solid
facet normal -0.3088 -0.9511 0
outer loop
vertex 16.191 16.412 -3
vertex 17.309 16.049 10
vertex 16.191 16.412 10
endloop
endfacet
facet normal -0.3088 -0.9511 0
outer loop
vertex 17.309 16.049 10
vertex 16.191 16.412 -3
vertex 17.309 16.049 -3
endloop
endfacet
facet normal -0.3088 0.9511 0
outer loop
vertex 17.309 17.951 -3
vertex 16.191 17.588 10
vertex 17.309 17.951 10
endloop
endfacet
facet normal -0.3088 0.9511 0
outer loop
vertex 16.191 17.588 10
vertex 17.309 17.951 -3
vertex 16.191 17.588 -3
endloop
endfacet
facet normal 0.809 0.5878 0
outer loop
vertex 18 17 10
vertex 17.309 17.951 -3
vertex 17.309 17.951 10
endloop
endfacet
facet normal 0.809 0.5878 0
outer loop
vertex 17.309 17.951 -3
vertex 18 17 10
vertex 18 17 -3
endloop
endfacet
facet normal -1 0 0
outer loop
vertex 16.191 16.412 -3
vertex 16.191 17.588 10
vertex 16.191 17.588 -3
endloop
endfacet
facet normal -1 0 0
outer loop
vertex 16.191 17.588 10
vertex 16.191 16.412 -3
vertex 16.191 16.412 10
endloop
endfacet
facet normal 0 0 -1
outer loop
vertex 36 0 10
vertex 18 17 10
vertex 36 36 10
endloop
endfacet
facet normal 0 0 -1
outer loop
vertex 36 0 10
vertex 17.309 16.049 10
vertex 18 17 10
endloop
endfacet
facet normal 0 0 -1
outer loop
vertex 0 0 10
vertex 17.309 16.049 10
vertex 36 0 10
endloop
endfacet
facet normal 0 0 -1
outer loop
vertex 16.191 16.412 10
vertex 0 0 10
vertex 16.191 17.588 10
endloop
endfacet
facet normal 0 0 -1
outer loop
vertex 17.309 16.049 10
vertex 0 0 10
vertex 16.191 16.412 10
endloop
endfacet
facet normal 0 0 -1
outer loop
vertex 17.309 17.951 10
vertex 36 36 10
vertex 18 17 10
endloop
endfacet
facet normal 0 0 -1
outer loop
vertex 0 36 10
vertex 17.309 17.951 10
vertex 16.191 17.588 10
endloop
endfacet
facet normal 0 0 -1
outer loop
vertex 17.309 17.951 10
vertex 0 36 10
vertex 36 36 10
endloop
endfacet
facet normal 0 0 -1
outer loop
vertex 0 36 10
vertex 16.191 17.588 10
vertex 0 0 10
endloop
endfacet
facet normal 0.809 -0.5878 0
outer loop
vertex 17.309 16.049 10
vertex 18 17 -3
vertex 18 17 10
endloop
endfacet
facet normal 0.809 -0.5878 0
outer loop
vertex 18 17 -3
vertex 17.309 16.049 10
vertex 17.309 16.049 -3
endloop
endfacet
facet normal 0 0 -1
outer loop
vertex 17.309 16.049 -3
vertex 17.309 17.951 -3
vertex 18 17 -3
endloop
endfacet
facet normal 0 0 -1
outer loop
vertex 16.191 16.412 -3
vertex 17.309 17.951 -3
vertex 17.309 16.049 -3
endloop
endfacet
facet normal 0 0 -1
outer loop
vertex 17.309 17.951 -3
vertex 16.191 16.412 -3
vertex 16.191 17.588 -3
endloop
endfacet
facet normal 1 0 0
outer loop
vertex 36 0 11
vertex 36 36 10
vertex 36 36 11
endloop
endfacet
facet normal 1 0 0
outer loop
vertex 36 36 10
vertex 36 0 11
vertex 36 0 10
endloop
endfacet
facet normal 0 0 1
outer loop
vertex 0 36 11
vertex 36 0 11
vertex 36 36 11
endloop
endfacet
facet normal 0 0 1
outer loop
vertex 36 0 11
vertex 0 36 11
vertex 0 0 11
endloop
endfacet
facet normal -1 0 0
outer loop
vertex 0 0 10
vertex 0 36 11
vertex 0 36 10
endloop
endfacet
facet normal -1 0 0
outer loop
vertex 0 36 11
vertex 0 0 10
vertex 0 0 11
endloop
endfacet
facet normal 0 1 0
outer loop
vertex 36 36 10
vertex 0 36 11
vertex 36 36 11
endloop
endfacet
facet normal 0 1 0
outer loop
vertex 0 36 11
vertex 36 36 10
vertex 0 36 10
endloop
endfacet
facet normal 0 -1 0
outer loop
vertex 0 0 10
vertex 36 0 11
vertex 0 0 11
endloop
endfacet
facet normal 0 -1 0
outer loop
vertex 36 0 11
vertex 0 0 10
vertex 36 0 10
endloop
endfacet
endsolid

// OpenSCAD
//Settings.
resolution_factor = 1; //Increase to reduce resolution and file size.

//Calculations.
res = 360 / resolution_factor;
wave_points = (res + 1) * (res + 1);

points = [
	for(x = [0:res])
		for(y = [0:res])
			[x / 10 * resolution_factor, y / 10 * resolution_factor, sin(x * resolution_factor * 4) + sin(y * resolution_factor * 4)], //Points of the waveform.
	[0, 0, -3], //Four bottom corners.
	[36, 0, -3],
	[36, 36, -3],
	[0, 36, -3]
];
faces = [
	for(x = [0:res - 1])
		for(y = [0:res - 1])
			[x * (res + 1) + y, x * (res + 1) + y + 1, (x + 1) * (res + 1) + y + 1, (x + 1) * (res + 1) + y], //Waveform.
	[ //Side on low Y.
		for(x = [0:res]) x * (res + 1),
		wave_points + 1,
		wave_points
	],
	[ //Side on high X.
		for(y = [0:res]) res * (res + 1) + y,
		wave_points + 2,
		wave_points + 1
	],
	[ //Side on high Y.
		for(x = [0:res]) (res - x) * (res + 1) + res,
		wave_points + 3,
		wave_points + 2
	],
	[ //Side on low X.
		for(y = [0:res]) res - y,
		wave_points,
		wave_points + 3
	],
	[ //Bottom side.
		for(i = [0:3]) wave_points + i
	]
];

//The model.
polyhedron(points, faces);
translate([17, 17, -3]) {
	cylinder(r=1, h=13);
}
translate([0, 0, 10]) {
	cube([36, 36, 1]);
}
